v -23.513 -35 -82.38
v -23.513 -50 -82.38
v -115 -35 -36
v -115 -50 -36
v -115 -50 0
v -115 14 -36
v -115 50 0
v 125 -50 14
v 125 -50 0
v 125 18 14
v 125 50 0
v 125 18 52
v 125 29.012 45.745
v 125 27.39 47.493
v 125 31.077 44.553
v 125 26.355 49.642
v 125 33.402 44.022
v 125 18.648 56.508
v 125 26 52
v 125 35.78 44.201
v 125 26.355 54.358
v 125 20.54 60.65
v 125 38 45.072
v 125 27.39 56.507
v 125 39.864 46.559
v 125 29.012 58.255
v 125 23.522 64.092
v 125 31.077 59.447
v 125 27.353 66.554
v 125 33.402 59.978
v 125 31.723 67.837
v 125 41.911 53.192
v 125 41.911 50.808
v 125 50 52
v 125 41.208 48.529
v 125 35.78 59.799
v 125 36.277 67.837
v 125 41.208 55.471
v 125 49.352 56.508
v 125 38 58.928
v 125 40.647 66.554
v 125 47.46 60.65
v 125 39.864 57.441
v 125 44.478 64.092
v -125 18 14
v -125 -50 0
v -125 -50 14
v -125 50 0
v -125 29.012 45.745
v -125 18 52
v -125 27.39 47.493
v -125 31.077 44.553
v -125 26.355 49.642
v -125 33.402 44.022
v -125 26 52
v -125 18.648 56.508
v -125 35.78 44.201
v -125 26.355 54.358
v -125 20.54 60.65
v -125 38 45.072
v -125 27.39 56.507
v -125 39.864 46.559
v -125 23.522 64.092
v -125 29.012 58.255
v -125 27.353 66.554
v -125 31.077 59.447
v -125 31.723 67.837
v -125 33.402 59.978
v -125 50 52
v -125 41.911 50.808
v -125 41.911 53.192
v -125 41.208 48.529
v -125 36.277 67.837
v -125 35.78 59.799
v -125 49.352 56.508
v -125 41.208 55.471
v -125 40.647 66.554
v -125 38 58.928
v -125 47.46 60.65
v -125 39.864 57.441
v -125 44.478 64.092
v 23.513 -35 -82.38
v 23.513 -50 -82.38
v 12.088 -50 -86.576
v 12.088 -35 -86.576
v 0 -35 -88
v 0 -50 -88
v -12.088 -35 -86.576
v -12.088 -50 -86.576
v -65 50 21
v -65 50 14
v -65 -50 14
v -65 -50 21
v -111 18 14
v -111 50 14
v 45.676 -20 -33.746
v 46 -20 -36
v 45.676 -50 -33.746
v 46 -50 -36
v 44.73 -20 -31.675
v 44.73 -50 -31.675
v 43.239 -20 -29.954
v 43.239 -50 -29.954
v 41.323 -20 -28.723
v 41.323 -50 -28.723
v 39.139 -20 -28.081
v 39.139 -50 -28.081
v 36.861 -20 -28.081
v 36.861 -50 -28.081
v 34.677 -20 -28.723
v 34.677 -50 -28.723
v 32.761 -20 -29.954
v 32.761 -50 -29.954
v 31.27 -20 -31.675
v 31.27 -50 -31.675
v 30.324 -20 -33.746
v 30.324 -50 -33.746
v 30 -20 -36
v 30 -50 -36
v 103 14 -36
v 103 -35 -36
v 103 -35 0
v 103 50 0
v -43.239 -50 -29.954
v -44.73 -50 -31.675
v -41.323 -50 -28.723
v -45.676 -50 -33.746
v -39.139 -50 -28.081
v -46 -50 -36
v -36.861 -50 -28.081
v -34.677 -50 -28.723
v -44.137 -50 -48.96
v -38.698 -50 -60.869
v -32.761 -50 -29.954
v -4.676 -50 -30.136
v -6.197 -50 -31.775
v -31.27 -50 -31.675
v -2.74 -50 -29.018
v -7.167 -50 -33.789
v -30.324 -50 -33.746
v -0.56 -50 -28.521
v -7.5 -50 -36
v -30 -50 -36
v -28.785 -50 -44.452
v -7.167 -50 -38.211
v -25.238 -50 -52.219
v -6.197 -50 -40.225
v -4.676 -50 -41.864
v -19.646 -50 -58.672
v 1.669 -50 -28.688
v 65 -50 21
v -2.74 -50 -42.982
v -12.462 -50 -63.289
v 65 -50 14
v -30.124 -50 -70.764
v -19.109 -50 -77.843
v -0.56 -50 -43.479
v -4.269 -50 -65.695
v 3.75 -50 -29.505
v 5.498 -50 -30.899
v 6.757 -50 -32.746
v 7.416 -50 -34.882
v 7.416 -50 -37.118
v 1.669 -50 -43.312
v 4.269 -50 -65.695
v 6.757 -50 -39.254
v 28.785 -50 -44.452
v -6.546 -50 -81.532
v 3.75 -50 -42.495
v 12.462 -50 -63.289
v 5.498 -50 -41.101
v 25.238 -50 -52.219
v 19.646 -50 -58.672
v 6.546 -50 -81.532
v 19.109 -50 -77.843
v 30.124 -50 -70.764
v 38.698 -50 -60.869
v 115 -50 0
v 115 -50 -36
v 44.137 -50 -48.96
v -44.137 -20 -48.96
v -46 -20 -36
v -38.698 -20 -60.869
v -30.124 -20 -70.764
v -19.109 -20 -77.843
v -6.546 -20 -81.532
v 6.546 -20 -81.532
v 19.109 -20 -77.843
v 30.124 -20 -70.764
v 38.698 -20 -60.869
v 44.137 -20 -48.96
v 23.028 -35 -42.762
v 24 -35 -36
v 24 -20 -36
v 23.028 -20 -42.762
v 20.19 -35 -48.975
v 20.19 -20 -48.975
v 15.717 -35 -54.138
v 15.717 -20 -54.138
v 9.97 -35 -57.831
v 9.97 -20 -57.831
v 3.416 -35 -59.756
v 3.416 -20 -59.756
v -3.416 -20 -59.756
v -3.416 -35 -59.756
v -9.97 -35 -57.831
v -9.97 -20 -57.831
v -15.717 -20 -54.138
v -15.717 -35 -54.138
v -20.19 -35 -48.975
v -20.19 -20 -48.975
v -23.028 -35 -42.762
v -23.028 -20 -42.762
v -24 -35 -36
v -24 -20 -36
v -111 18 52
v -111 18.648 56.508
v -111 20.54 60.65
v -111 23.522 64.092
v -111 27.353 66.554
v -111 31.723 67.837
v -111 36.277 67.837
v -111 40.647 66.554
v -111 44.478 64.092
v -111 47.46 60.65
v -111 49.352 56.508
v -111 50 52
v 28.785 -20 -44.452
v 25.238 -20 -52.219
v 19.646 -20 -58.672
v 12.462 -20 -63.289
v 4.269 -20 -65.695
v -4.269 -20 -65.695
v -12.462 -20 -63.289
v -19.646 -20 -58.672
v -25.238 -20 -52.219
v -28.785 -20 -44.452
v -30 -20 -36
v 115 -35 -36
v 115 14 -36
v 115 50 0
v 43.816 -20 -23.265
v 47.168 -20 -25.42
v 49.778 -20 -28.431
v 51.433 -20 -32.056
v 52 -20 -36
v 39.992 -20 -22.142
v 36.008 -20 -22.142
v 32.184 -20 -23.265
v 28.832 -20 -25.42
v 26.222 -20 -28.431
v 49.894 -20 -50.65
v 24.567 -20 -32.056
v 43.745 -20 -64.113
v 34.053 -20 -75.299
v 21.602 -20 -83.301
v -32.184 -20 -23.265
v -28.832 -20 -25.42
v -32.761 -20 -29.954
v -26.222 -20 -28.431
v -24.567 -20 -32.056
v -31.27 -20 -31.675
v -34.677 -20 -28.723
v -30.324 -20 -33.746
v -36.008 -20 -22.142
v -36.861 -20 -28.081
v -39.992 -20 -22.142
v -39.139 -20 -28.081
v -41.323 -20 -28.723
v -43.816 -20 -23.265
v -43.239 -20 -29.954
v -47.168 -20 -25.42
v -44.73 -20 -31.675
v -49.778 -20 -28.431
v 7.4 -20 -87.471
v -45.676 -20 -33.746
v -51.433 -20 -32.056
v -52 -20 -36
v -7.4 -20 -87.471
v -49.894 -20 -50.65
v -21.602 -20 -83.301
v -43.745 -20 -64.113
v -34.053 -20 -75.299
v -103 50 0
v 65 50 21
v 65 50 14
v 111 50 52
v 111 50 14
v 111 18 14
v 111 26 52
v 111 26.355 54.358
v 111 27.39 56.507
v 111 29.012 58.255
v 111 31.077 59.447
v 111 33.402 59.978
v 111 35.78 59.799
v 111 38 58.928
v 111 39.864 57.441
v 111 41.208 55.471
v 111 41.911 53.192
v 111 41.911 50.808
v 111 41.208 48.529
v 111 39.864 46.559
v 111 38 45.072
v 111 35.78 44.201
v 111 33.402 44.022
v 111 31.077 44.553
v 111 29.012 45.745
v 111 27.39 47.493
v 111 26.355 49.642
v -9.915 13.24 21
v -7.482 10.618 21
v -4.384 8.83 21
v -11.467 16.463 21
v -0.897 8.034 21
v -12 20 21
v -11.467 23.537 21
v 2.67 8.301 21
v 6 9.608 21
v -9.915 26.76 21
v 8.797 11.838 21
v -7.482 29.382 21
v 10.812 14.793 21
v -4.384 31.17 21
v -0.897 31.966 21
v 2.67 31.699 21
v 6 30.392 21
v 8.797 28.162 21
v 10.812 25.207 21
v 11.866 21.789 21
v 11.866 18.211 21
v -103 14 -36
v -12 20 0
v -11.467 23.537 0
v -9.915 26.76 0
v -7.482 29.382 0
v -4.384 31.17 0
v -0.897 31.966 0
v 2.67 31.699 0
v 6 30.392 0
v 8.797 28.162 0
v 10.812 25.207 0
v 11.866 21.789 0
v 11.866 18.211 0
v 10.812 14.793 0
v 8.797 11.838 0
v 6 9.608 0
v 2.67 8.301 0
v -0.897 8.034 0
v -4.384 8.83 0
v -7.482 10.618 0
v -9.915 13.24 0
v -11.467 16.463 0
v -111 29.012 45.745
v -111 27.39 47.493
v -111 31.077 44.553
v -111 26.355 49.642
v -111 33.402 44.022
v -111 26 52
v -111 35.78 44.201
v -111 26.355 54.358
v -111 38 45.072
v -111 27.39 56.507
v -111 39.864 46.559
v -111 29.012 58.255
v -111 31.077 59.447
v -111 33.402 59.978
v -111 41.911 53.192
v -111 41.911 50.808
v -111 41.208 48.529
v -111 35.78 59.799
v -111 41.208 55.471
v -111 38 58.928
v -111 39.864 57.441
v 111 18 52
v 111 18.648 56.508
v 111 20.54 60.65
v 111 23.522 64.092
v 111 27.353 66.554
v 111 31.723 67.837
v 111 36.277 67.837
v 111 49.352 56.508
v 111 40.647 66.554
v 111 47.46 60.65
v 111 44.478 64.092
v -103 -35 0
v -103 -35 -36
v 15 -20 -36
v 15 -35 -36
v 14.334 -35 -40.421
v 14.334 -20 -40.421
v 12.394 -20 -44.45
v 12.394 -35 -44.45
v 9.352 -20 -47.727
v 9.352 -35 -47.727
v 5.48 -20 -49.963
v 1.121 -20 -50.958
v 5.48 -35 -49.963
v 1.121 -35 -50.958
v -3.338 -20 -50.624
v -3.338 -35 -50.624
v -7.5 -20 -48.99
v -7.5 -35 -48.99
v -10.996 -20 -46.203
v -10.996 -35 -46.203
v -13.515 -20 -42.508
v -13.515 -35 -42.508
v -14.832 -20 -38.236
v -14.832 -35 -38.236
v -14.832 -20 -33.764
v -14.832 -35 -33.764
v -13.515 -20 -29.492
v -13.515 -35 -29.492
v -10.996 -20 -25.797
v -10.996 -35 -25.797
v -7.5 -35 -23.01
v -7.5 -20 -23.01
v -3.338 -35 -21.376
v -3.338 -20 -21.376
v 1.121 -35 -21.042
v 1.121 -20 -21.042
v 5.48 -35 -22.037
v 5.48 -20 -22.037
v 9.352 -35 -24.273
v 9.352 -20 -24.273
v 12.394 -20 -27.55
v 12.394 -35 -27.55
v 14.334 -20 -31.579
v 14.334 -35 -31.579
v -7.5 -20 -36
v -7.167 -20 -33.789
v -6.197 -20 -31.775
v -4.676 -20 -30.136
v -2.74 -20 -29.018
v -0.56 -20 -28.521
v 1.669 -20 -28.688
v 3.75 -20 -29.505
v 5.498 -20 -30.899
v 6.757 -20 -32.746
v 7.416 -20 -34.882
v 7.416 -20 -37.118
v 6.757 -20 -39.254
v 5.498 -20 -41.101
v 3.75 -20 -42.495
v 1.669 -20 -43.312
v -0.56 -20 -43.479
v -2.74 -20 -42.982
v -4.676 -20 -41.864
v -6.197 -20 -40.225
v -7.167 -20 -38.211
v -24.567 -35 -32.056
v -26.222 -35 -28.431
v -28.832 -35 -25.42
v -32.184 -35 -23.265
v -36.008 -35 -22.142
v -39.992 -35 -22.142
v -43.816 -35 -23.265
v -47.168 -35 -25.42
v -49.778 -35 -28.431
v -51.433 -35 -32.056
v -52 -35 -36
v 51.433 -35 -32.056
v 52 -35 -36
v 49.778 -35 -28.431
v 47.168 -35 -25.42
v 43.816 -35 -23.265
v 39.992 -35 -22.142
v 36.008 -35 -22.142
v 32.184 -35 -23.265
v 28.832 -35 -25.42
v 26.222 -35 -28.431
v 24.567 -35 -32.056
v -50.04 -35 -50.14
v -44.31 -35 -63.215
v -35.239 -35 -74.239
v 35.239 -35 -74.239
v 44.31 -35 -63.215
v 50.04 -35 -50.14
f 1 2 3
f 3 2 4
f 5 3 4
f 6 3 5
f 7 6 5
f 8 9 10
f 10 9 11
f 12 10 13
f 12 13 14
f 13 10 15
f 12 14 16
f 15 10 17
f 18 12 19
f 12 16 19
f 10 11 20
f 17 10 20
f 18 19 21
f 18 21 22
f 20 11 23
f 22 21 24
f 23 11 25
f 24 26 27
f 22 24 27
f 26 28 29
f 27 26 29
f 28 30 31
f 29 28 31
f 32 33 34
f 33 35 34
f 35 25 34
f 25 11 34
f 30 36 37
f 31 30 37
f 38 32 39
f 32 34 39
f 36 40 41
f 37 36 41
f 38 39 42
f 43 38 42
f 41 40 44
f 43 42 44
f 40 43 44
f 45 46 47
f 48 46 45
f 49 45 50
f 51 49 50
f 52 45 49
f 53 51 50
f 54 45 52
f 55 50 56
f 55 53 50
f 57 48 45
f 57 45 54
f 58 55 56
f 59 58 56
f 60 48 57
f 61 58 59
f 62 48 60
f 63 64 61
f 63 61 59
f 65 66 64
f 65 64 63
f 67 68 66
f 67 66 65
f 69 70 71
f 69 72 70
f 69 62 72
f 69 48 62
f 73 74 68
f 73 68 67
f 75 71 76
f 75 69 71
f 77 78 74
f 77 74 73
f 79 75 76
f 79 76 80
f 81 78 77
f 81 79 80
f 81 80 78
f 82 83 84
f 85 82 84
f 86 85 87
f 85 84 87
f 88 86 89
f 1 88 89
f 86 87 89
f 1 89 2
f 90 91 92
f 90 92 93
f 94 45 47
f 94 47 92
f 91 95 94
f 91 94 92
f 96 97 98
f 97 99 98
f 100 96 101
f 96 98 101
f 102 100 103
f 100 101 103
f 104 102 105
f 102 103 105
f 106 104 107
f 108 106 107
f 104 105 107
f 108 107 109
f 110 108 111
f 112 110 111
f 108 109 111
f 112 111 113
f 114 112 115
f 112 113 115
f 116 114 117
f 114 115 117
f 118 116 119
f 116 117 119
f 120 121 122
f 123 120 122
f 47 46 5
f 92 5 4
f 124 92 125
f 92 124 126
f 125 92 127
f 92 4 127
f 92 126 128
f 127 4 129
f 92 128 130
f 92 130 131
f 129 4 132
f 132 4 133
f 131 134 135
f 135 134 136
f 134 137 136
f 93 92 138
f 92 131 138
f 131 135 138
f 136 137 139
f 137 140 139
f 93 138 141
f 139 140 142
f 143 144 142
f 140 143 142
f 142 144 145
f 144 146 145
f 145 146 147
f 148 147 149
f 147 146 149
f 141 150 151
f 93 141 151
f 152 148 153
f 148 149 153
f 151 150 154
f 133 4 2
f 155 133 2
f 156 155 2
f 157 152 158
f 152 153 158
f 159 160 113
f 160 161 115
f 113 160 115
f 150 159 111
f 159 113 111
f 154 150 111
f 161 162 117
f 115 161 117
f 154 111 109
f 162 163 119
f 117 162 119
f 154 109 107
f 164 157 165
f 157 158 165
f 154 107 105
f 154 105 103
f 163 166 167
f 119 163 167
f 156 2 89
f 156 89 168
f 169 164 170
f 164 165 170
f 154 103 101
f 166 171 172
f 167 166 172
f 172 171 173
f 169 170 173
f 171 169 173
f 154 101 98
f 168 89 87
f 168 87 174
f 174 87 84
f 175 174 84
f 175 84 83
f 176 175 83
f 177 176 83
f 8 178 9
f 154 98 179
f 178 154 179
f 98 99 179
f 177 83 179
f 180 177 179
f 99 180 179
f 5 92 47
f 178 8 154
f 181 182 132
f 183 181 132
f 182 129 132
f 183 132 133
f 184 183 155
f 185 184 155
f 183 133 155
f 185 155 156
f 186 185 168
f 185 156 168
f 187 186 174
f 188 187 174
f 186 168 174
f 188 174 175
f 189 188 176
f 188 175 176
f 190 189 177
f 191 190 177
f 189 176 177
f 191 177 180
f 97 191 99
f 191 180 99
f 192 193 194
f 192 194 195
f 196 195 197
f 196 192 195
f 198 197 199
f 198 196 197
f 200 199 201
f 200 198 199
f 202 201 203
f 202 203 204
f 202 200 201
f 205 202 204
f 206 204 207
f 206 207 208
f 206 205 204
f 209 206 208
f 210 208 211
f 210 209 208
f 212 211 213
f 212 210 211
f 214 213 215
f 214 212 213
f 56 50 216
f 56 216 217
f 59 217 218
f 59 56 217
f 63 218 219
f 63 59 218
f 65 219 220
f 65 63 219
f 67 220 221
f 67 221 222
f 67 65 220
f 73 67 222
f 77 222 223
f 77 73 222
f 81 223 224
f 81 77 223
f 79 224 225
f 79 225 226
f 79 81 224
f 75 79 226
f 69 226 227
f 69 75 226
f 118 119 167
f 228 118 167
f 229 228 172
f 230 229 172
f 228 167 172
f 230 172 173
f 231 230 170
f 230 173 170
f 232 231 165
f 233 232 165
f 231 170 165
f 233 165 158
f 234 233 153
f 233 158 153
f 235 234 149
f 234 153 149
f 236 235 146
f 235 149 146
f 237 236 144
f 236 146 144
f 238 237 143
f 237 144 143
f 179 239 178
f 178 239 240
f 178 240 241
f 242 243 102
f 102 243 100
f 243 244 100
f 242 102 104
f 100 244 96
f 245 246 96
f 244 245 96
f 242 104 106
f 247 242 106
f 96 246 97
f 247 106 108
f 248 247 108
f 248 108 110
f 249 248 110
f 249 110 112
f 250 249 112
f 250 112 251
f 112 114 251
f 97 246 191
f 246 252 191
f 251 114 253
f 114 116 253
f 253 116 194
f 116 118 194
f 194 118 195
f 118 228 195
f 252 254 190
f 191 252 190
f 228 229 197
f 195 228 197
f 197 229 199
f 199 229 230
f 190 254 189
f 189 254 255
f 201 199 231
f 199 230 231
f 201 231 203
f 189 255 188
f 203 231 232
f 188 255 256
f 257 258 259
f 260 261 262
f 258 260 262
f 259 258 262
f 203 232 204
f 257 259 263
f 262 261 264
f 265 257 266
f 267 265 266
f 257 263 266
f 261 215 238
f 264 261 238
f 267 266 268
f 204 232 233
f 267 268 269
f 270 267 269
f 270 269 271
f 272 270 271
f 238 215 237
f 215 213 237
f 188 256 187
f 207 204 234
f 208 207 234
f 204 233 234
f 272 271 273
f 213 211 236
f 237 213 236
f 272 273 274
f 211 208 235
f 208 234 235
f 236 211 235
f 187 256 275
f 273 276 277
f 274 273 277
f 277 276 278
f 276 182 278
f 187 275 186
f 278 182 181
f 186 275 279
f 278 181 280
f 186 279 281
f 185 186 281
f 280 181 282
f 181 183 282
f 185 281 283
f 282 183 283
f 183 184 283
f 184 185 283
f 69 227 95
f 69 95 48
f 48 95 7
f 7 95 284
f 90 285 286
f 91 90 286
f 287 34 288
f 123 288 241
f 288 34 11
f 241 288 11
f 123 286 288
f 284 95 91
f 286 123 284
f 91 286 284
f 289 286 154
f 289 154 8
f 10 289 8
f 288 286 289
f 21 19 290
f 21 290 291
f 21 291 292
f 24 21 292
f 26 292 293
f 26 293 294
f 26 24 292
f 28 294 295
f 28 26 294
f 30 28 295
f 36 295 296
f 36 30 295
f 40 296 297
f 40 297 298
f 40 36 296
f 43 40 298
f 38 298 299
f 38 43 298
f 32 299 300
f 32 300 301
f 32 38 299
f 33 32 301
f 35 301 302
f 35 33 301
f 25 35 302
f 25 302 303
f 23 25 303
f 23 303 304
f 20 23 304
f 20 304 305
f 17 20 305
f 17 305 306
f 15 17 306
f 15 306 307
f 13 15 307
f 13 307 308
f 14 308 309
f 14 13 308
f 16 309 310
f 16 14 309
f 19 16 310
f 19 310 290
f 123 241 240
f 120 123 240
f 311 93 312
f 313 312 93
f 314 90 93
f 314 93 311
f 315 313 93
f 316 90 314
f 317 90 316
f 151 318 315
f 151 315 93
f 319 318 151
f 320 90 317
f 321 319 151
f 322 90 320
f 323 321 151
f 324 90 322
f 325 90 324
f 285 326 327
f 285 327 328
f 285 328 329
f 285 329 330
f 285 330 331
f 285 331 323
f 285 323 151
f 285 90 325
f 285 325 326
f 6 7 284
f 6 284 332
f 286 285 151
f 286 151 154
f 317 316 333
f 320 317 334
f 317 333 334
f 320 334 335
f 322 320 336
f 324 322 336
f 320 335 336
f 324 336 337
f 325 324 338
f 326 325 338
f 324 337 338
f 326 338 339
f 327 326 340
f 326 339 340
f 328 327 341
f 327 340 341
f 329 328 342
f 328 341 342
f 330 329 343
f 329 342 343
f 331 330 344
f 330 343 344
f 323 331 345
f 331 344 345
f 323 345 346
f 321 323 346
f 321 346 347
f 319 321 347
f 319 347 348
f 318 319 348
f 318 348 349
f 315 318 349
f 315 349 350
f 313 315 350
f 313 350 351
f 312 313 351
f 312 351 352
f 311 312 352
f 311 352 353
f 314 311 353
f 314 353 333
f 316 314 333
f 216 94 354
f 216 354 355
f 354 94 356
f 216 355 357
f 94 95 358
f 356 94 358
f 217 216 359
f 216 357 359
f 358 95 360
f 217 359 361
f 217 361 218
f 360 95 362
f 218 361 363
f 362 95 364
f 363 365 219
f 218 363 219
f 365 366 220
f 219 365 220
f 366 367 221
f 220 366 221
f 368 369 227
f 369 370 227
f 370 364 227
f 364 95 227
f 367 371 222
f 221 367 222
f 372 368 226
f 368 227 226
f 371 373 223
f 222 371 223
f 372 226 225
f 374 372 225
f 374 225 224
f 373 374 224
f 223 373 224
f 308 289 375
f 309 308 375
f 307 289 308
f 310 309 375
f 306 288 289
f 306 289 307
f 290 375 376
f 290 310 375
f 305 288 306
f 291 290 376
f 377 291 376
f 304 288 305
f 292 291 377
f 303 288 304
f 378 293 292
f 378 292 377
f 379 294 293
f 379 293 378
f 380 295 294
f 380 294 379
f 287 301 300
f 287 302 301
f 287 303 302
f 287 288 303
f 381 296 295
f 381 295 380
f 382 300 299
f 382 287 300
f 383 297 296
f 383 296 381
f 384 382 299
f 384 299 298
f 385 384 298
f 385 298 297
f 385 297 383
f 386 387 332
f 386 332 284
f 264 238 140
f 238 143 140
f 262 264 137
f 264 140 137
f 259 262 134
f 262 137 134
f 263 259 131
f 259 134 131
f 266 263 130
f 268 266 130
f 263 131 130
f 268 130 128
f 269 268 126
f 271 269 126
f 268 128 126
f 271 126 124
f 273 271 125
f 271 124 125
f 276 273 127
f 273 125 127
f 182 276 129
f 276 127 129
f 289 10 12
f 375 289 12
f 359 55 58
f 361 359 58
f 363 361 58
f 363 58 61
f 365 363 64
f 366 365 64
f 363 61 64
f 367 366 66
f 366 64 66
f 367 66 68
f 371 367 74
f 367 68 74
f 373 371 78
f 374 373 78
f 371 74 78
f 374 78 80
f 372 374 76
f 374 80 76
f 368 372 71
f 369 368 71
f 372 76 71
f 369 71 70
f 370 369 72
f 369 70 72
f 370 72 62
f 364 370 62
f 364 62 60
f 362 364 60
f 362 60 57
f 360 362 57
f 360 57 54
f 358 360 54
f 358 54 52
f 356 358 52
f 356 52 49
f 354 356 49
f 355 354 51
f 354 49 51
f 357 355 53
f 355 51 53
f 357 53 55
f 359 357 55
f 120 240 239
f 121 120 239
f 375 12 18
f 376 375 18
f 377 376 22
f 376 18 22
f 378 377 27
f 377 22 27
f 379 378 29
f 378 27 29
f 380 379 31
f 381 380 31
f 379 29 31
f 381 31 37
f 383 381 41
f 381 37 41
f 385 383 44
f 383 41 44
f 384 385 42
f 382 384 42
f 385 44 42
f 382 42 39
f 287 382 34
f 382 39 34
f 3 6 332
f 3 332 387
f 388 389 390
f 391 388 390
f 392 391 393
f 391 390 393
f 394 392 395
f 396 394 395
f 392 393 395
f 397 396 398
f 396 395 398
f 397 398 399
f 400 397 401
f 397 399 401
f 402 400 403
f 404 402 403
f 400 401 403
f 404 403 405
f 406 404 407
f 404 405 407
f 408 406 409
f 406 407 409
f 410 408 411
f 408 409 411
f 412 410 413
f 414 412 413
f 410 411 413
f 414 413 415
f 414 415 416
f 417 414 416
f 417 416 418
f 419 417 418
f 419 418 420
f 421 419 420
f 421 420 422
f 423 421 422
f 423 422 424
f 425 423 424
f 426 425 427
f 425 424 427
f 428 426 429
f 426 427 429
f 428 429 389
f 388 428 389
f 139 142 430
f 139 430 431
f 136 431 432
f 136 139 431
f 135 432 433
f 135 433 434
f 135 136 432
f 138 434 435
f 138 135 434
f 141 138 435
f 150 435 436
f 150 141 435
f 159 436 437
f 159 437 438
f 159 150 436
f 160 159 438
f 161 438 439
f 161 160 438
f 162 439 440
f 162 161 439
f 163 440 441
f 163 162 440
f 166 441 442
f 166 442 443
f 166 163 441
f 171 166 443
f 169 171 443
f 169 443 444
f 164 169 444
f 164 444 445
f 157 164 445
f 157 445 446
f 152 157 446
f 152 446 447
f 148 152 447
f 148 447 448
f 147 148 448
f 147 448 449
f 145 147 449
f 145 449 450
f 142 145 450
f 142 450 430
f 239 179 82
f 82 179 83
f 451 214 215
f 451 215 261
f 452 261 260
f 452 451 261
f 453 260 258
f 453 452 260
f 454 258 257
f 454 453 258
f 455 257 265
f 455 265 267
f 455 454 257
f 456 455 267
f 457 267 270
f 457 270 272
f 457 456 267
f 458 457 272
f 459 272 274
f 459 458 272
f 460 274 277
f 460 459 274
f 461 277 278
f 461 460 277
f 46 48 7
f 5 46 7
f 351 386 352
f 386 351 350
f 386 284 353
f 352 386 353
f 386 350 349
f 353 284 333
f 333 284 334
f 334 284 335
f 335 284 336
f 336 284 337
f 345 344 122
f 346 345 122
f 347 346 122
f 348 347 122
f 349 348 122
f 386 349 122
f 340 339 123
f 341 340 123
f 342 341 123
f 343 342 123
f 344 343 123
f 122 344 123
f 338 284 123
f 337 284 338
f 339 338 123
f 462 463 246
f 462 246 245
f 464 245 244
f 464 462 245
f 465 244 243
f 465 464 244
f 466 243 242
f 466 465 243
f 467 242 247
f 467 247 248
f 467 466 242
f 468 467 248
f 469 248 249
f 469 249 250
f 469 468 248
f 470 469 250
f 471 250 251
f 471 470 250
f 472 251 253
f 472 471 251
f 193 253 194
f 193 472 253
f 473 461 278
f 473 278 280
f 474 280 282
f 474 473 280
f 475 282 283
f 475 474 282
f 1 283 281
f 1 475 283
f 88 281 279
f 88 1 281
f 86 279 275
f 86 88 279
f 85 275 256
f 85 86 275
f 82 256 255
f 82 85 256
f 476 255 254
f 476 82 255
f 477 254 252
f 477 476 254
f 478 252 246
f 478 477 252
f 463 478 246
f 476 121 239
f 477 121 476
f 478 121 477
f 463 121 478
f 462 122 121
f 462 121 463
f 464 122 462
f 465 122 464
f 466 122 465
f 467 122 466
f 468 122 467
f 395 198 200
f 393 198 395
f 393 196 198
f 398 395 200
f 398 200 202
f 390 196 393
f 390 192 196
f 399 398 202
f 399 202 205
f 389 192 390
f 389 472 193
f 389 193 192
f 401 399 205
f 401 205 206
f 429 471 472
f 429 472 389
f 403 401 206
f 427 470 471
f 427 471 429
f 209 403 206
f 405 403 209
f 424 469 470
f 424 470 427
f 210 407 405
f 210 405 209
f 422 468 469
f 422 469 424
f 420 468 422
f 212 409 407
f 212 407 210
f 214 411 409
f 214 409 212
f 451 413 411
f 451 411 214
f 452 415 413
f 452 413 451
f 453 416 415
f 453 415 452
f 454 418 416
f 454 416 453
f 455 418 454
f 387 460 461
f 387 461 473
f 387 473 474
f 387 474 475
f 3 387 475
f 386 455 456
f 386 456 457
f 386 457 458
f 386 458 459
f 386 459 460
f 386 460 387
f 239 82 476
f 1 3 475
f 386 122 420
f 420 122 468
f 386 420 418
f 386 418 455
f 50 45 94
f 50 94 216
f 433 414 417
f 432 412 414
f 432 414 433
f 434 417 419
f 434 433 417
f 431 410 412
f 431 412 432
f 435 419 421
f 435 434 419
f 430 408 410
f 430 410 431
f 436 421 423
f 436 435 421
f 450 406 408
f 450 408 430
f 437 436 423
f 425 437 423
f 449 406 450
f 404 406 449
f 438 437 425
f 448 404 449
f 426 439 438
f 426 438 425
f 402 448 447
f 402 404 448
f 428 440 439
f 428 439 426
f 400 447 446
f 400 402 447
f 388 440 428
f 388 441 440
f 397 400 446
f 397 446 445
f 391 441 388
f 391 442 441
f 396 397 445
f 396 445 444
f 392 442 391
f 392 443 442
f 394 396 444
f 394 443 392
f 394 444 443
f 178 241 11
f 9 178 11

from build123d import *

# Parameters (mm, degrees)
SKETCH1_W           = 250
SKETCH1_H           = 100
BOSS_EXTRUDE1_DEPTH = 14
BOSS_EXTRUDE2_DEPTH = 100
SKETCH7_R           = 8
BOSS_EXTRUDE3_DEPTH = 14
SKETCH8_R           = 12
CUT_EXTRUDE1_DEPTH  = 25
BOSS_EXTRUDE4_DEPTH = 15
BOSS_EXTRUDE5_DEPTH = 12
SKETCH13_R          = 15
SKETCH13_R_2        = 7.5
BOSS_EXTRUDE6_DEPTH = 15
CUT_EXTRUDE2_START  = -15
SKETCH14_R          = 7.5
CUT_EXTRUDE2_DEPTH  = 15


with BuildPart() as part:
    # Sketch1 → Boss-Extrude1 (new body)
    with BuildSketch(Plane.XY):
        Rectangle(SKETCH1_W, SKETCH1_H)
    extrude(amount=BOSS_EXTRUDE1_DEPTH)

    # Sketch2 → Boss-Extrude2 (add)
    with BuildSketch(Plane(origin=(0, 50, 0), x_dir=(1, 0, 0), z_dir=(0, 1, 0))):
        Polygon((0, -14), (-65, -14), (-65, -21), (65, -21), (65, -14), align=None)
    extrude(amount=-BOSS_EXTRUDE2_DEPTH)

    # Sketch7 → Boss-Extrude3 (add)
    with BuildSketch(Plane.ZY.offset(125)):
        with BuildLine():
            Line((14, 50), (14, 18))
            Line((14, 18), (52, 18))
            ThreePointArc((52, 18), (68, 34), (52, 50))
            Line((52, 50), (14, 50))
        make_face()
        with Locations(Location((52, 34, 0), (0, 0, 270))):
            Circle(SKETCH7_R, mode=Mode.SUBTRACT)
    boss_extrude3 = extrude(amount=-BOSS_EXTRUDE3_DEPTH)

    # Mirror1: Boss-Extrude3 across plane
    add(boss_extrude3.mirror(Plane(origin=(0, 0, 0), x_dir=(0, 0, 1), z_dir=(1, 0, 0))))

    # Sketch8 → Cut-Extrude1 (cut)
    with BuildSketch(Plane(origin=(0, 0, 0), x_dir=(-1, 0, 0), z_dir=(0, 0, -1))):
        with Locations((0, 20)):
            Circle(SKETCH8_R)
    extrude(amount=-CUT_EXTRUDE1_DEPTH, mode=Mode.SUBTRACT)



with BuildPart() as body_2:
    # Sketch10 → Boss-Extrude4 (new body)
    with BuildSketch(Plane.XZ.offset(50)):
        with BuildLine():
            Line((115, 0), (115, -36))
            Line((115, -36), (23.513043478, -82.38034914))
            ThreePointArc((23.513043478, -82.38034914), (0, -88), (-23.513043478, -82.38034914))
            Line((-23.513043478, -82.38034914), (-115, -36))
            Line((-115, -36), (-115, 0))
            Line((-115, 0), (115, 0))
        make_face()
    extrude(amount=-BOSS_EXTRUDE4_DEPTH)


with BuildPart() as part_1:
    add(part.part)

    add(body_2.part)  # Boss-Extrude5 merges body 2
    # Sketch12 → Boss-Extrude5 (add)
    with BuildSketch(Plane(origin=(115, 0, 0), x_dir=(0, 0, -1), z_dir=(1, 0, 0))):
        Polygon((0, -35), (0, 50), (36, 14), (36, -35), align=None)
    boss_extrude5 = extrude(amount=-BOSS_EXTRUDE5_DEPTH)

    # Mirror2: Boss-Extrude5 across plane
    add(boss_extrude5.mirror(Plane(origin=(0, 0, 0), x_dir=(0, 0, 1), z_dir=(1, 0, 0))))

    # Sketch13 → Boss-Extrude6 (add)
    # profile 1 of 2: a face of its own
    with BuildSketch(Plane(origin=(0, -35, 0), x_dir=(1, 0, 0), z_dir=(0, 1, 0))):
        with Locations((0, 36)):
            Circle(SKETCH13_R)
        with Locations(Location((0, 36, 0), (0, 0, 180))):
            Circle(SKETCH13_R_2, mode=Mode.SUBTRACT)
    # profile 2 of 2: a face of its own
    with BuildSketch(Plane(origin=(0, -35, 0), x_dir=(1, 0, 0), z_dir=(0, 1, 0))):
        with BuildLine():
            ThreePointArc((24, 36), (0, 60), (-24, 36))
            ThreePointArc((-24, 36), (-38, 22), (-52, 36))
            ThreePointArc((-52, 36), (0, 88), (52, 36))
            ThreePointArc((52, 36), (38, 22), (24, 36))
        make_face()
        with BuildLine():
            ThreePointArc((30, 36), (0, 66), (-30, 36))
            ThreePointArc((-30, 36), (-38, 28), (-46, 36))
            ThreePointArc((-46, 36), (0, 82), (46, 36))
            ThreePointArc((46, 36), (38, 28), (30, 36))
        make_face(mode=Mode.SUBTRACT)
    extrude(amount=BOSS_EXTRUDE6_DEPTH)

    # Sketch14 → Cut-Extrude2 (cut)
    with BuildSketch(Plane(origin=(0, -35, 0), x_dir=(1, 0, 0), z_dir=(0, 1, 0)).offset(CUT_EXTRUDE2_START)):
        with Locations(Location((0, 36, 0), (0, 0, 180))):
            Circle(SKETCH14_R)
        with BuildLine():
            ThreePointArc((30, 36), (0, 66), (-30, 36))
            ThreePointArc((-30, 36), (-38, 28), (-46, 36))
            ThreePointArc((-46, 36), (0, 82), (46, 36))
            ThreePointArc((46, 36), (38, 28), (30, 36))
        make_face()
    extrude(amount=CUT_EXTRUDE2_DEPTH, mode=Mode.SUBTRACT)


solid = part_1.part
